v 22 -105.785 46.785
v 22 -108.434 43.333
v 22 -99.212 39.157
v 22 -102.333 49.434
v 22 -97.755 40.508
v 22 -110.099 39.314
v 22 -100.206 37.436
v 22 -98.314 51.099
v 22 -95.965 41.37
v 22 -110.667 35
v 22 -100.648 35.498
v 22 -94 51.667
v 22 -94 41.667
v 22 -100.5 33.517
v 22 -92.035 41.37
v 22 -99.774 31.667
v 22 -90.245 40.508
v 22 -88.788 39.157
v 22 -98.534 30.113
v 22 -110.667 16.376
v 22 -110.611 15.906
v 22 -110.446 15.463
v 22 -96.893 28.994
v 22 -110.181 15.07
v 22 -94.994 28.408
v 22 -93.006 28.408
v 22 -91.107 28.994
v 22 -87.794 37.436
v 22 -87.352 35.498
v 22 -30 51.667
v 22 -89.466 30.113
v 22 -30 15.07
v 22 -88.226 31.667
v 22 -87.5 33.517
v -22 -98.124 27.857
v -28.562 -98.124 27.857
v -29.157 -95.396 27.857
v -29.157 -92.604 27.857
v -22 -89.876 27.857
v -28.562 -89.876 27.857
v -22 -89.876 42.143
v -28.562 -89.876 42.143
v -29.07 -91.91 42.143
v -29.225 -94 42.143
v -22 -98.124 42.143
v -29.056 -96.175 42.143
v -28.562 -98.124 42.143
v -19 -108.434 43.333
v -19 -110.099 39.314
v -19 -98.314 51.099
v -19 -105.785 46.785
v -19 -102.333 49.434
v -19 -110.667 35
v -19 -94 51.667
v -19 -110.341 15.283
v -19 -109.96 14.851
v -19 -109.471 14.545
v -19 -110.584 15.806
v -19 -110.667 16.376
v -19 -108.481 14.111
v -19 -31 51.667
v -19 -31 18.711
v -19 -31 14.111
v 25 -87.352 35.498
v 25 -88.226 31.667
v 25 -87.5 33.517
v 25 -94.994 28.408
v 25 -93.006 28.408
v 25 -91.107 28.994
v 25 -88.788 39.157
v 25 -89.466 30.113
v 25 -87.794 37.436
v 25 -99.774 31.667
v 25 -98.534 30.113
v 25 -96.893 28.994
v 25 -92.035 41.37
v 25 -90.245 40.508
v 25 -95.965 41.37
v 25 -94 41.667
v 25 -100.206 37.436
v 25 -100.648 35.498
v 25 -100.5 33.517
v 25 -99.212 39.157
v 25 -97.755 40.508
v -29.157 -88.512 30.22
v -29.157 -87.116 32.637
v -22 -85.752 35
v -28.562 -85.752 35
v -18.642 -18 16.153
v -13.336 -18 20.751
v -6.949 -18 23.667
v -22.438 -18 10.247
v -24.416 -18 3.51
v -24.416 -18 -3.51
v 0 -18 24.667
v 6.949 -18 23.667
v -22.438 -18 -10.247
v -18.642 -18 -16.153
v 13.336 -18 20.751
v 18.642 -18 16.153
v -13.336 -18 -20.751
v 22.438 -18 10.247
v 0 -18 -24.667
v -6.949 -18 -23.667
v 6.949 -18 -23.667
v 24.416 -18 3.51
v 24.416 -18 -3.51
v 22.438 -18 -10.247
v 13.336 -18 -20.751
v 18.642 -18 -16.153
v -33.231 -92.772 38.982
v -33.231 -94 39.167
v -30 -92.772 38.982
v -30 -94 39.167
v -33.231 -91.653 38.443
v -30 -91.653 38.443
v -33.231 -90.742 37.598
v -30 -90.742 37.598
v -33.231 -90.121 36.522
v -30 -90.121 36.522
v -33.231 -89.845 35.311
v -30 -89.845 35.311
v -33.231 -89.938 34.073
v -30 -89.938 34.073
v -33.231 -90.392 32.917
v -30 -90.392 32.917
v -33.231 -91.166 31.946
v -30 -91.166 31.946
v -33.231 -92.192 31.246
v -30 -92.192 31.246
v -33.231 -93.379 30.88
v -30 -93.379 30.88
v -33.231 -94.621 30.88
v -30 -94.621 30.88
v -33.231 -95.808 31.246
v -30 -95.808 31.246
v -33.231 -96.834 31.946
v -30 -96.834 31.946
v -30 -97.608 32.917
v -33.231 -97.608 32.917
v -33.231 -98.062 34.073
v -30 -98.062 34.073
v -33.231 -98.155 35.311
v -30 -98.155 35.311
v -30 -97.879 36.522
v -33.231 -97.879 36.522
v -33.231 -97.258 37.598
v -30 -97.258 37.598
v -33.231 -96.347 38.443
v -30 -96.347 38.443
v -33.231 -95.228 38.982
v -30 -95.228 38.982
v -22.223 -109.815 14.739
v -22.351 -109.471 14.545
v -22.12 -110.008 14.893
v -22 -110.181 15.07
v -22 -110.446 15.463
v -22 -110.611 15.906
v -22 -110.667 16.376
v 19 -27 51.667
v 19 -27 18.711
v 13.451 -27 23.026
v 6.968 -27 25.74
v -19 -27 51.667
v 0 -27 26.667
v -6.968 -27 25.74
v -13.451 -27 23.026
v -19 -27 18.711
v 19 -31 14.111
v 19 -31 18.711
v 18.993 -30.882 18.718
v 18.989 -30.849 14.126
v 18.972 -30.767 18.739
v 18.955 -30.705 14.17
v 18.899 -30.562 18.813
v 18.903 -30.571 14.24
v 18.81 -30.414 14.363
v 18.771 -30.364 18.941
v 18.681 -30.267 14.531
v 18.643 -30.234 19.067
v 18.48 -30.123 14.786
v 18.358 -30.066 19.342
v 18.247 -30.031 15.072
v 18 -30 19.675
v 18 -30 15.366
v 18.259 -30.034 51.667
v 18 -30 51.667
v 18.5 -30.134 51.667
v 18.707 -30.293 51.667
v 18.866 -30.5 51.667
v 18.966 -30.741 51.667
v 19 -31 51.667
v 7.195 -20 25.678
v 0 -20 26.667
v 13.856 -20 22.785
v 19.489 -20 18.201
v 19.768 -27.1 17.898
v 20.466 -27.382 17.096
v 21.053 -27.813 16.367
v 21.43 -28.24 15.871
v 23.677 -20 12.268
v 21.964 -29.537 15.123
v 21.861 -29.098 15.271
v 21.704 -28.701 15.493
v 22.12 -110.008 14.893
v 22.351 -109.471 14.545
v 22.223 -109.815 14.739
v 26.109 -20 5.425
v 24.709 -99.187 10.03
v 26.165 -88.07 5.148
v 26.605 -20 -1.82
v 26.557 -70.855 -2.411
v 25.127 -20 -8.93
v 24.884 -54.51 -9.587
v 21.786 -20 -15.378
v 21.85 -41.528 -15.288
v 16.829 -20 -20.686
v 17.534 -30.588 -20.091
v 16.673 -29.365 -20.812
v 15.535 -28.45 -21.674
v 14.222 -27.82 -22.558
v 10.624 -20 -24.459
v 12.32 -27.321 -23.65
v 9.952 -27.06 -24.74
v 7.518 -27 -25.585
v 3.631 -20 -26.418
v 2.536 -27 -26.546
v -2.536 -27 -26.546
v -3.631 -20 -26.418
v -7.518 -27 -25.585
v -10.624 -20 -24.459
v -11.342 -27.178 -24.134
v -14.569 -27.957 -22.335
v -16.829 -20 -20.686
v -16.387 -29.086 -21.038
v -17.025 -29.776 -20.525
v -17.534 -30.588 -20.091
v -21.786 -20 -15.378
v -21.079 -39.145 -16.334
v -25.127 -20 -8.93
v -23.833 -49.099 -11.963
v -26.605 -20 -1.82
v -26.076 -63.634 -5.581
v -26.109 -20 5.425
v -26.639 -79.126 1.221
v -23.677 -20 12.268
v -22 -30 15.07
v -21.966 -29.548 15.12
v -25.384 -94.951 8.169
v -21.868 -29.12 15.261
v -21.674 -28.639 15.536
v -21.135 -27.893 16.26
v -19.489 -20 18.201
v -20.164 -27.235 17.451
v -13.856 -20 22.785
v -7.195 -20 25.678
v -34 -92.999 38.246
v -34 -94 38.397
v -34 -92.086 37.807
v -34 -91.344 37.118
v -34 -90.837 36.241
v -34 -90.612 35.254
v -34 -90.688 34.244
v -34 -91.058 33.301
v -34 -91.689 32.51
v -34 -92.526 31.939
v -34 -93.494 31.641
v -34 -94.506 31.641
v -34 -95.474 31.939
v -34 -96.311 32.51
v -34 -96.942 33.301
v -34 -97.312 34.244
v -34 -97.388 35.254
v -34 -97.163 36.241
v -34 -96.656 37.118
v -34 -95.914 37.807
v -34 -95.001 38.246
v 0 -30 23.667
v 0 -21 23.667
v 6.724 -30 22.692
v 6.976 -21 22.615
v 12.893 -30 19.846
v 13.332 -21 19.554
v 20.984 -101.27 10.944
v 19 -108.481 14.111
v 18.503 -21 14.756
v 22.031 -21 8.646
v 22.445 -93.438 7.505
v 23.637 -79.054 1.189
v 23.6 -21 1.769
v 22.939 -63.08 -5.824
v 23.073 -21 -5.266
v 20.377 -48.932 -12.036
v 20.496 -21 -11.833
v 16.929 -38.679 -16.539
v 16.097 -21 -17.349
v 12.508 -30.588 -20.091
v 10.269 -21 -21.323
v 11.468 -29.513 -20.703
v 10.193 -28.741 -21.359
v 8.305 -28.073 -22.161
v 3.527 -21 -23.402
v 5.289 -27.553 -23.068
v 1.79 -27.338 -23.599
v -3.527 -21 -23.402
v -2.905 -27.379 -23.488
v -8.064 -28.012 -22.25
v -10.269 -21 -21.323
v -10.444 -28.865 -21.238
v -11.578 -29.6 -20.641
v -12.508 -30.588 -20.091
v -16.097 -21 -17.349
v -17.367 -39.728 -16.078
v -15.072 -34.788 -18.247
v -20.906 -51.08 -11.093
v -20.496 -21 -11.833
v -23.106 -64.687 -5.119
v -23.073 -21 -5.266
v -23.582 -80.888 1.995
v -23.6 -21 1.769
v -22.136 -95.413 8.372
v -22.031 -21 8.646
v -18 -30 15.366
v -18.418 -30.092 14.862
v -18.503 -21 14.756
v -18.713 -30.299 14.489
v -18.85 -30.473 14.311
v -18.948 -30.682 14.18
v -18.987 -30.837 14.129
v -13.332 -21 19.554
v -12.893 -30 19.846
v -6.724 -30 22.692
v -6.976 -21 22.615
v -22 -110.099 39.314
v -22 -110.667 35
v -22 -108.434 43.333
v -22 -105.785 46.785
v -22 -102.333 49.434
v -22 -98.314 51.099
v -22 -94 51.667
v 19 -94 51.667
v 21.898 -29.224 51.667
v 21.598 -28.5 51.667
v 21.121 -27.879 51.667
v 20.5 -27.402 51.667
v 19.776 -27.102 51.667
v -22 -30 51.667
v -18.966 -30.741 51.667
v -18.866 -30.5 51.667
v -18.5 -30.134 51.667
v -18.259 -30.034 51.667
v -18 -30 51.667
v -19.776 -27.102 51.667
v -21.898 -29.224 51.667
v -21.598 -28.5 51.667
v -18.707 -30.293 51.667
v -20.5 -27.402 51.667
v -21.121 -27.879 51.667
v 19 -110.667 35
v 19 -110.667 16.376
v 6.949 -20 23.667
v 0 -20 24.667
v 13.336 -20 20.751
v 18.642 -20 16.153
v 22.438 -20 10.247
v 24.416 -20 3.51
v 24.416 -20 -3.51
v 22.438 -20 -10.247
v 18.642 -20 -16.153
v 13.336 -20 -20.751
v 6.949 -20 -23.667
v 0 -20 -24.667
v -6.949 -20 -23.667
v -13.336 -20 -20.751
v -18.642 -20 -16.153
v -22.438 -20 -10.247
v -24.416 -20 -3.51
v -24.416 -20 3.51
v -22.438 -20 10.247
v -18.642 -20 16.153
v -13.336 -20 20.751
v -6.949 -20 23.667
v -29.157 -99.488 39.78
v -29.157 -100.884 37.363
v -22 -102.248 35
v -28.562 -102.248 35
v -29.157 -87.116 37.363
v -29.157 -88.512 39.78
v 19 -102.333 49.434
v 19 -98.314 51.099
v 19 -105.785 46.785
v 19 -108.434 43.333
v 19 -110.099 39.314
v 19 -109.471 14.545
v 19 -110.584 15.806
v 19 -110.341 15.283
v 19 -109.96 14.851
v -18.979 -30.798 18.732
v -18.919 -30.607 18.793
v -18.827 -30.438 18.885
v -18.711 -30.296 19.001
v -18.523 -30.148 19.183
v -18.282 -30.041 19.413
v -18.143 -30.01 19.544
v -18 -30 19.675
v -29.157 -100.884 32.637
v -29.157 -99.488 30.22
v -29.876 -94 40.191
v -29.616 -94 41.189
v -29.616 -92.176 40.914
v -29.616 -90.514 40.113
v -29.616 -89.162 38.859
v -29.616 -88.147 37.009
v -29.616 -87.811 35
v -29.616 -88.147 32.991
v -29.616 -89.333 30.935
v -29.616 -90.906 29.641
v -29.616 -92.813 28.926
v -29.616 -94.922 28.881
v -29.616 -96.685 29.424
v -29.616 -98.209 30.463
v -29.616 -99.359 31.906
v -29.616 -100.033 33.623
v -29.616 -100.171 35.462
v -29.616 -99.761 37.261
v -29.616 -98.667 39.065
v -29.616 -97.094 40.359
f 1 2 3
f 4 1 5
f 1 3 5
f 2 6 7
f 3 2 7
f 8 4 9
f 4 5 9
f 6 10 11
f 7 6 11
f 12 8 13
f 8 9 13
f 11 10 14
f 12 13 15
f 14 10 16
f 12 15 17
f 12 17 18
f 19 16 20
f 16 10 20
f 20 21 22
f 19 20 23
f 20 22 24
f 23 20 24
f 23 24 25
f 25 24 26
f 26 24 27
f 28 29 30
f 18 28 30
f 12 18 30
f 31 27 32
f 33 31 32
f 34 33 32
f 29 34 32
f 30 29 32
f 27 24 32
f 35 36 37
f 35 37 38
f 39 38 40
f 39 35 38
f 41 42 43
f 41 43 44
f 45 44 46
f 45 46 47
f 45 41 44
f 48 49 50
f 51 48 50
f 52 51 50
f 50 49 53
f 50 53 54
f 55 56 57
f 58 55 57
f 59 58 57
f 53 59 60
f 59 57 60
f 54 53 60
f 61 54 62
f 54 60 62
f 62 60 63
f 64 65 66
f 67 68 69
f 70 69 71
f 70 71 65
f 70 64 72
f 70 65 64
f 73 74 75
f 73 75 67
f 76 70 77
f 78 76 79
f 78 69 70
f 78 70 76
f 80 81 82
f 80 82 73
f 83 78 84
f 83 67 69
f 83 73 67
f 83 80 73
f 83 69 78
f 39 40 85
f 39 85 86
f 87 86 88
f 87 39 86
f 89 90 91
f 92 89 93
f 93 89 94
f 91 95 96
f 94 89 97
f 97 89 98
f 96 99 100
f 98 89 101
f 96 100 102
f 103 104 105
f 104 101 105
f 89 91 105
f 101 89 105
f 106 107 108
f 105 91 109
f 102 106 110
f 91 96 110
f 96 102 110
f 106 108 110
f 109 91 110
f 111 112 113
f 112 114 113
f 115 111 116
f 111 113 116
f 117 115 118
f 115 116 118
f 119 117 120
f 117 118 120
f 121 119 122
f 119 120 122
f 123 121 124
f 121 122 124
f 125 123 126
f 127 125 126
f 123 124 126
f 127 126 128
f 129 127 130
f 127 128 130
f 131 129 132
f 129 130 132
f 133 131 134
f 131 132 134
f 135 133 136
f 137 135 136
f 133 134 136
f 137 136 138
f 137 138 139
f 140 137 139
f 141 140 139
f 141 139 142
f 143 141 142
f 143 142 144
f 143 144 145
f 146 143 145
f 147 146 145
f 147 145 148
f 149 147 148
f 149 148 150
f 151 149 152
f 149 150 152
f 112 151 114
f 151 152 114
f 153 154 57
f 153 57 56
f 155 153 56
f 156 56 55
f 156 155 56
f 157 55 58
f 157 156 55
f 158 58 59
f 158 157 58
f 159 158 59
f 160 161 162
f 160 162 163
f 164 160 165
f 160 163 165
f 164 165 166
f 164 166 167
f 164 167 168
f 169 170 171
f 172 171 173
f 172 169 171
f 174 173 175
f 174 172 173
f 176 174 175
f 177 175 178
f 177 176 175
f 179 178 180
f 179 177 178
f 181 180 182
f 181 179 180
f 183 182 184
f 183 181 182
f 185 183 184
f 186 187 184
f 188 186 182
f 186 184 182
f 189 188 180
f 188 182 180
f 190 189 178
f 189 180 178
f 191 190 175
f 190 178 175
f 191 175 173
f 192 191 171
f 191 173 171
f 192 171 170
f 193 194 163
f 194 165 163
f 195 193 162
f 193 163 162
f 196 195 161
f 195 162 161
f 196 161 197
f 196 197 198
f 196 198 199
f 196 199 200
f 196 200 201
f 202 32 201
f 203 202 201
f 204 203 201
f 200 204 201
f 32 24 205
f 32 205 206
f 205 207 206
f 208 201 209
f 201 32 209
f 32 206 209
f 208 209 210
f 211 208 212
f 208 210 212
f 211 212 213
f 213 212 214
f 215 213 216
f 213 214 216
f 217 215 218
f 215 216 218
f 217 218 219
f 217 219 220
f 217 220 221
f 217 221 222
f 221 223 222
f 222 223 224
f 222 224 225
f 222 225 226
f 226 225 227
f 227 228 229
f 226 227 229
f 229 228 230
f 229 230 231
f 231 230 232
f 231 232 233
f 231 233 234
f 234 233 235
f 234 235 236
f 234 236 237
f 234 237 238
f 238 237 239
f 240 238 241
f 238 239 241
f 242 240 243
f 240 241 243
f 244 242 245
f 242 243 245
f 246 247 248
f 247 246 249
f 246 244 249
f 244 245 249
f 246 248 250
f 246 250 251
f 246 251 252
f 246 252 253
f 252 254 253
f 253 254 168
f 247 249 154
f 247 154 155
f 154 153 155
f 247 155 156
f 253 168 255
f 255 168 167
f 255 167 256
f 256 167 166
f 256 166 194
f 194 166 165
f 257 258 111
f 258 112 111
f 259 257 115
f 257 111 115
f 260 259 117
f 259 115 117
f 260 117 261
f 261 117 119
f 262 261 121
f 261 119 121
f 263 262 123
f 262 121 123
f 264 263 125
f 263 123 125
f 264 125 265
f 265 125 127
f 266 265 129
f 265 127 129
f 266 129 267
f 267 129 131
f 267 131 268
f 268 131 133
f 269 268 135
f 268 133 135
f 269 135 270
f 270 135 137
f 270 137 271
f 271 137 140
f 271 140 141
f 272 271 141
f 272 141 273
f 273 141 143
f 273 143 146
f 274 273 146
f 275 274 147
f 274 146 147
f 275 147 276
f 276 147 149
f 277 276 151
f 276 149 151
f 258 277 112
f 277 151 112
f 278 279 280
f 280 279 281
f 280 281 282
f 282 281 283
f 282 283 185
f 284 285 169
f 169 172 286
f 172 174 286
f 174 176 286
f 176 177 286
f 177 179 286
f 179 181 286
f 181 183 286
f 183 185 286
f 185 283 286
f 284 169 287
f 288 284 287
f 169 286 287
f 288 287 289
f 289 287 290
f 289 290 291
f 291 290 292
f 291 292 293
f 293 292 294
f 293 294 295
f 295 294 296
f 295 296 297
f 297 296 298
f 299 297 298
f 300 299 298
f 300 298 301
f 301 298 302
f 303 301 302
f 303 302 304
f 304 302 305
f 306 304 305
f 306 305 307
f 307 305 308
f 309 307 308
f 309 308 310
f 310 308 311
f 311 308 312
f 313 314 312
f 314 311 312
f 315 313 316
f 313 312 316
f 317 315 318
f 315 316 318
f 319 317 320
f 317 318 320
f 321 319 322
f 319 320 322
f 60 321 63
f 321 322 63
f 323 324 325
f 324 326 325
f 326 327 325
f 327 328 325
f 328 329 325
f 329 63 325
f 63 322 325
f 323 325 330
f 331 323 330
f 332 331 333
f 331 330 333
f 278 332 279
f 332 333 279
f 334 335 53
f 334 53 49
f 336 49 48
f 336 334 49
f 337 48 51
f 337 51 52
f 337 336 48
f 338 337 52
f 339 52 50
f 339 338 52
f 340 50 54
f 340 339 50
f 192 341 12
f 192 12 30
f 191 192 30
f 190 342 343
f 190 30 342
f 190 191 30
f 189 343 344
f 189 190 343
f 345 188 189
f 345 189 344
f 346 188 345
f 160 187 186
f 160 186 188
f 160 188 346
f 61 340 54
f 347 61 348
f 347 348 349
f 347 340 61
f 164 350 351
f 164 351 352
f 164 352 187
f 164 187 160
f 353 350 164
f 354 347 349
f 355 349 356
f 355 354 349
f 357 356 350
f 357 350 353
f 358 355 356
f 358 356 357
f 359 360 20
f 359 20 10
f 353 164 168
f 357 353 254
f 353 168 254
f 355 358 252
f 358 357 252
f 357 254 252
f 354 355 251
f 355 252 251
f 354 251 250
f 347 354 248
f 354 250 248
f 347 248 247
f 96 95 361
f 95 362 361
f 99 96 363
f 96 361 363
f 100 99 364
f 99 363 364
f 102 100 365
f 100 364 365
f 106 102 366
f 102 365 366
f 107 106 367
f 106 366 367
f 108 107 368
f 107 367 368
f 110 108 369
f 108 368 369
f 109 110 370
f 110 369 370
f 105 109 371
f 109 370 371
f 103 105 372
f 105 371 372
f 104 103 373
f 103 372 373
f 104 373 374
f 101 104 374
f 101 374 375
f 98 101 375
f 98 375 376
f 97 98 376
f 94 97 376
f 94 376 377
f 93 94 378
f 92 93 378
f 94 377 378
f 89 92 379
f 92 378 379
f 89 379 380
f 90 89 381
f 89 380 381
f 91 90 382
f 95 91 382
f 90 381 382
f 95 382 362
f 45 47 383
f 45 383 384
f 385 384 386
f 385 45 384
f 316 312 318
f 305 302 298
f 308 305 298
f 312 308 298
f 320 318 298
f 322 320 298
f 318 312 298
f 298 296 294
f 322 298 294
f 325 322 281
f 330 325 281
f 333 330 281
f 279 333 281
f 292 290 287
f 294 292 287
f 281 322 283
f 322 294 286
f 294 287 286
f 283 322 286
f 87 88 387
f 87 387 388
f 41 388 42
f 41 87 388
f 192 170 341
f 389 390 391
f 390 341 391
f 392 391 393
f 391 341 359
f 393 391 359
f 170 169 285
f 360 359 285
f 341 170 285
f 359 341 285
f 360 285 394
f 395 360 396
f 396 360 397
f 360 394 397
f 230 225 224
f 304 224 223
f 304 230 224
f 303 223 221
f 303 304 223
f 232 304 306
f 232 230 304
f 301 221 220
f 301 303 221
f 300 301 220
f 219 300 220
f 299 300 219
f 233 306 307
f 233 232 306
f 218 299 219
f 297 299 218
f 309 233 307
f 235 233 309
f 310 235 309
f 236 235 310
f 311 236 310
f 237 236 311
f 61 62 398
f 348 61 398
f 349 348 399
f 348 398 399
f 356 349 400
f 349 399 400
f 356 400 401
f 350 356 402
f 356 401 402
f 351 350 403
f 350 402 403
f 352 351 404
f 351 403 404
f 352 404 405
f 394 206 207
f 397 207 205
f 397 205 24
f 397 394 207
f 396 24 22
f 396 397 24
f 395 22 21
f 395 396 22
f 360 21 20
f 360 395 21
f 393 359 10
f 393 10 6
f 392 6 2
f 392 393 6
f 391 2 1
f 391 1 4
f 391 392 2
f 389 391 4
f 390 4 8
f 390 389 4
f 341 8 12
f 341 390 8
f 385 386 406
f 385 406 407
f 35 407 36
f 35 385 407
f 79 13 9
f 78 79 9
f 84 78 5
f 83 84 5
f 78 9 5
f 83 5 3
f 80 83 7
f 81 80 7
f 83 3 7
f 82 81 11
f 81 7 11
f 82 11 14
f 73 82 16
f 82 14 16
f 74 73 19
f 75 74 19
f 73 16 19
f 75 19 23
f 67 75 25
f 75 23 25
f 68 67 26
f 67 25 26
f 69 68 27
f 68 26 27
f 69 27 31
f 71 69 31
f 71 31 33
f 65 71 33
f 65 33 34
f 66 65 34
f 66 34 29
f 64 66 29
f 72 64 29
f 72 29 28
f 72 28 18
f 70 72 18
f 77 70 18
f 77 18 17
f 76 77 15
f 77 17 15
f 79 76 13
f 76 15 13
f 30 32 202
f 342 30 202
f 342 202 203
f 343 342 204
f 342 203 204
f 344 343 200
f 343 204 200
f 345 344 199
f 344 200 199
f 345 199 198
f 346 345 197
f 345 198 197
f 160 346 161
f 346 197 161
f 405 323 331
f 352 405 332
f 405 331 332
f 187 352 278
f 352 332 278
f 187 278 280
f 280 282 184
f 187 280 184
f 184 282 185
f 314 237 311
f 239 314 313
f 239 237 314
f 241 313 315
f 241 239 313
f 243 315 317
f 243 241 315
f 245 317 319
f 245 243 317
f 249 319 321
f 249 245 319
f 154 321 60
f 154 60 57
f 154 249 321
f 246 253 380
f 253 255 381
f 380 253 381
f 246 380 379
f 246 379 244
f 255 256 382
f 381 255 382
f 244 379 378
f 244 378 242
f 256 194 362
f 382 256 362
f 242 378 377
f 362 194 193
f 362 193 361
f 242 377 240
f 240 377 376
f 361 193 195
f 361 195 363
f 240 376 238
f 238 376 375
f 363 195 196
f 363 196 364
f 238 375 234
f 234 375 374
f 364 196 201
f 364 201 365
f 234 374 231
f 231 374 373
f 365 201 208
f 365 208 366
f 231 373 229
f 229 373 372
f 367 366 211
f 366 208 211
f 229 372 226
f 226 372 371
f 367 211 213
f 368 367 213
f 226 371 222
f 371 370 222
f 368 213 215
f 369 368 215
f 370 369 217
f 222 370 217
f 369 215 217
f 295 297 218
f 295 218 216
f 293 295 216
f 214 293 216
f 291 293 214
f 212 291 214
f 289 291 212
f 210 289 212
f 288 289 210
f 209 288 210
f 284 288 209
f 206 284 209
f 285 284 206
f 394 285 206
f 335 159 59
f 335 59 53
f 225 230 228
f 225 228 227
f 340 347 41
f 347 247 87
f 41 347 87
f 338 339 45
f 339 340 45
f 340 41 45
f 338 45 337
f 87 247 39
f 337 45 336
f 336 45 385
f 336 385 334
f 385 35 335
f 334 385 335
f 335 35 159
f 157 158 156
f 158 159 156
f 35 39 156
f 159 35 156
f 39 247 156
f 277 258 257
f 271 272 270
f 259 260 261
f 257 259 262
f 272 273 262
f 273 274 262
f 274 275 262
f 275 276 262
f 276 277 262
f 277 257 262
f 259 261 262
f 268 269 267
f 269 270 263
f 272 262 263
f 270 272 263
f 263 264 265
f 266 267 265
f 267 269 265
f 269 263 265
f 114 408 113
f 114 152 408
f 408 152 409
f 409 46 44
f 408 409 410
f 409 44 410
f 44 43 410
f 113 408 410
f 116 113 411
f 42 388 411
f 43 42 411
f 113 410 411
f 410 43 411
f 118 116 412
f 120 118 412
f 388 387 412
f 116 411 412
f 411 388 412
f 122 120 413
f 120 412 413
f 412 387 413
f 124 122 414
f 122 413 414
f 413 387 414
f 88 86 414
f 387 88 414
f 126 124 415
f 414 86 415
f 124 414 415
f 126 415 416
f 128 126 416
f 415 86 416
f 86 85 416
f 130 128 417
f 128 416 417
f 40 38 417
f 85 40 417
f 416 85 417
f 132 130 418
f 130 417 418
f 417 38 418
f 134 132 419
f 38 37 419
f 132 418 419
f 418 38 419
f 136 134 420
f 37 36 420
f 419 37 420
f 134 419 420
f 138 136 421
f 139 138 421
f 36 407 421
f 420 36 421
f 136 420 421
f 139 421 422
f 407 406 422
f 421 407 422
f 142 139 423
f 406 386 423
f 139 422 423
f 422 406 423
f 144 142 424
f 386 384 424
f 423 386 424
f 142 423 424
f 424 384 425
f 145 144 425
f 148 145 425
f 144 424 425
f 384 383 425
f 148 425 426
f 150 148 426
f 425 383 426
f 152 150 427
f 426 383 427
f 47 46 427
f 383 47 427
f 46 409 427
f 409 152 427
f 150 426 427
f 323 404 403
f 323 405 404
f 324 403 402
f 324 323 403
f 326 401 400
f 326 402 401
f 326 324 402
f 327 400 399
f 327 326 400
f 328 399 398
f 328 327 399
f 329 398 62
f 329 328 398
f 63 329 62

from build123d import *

# Parameters (mm, degrees)
EXTRUDE_1_DEPTH          = 96
CUT_EXTRUDE_1_DEPTH      = 96
SKETCH_4_R               = 23.666666667
CUT_EXTRUDE_2_DEPTH      = 144
CUT_EXTRUDE_3_DEPTH      = 96
CUT_EXTRUDE_3_DEPTH_BACK = 96
SKETCH_7_R               = 9.192307692
CUT_EXTRUDE_4_DEPTH      = 20
SKETCH_8_R               = 6.666666667
EXTRUDE_2_DEPTH          = 3


with BuildPart() as part:
    # 草图1 → 旋转1 (revolve)
    with BuildSketch(Plane.XY, mode=Mode.PRIVATE) as revolve_1_sk:
        Polygon((0, -18), (24.666666667, -18), (24.666666667, -20), (26.666666667, -20), (26.666666667, -162), (0, -162), align=None)
    revolve(revolve_1_sk.sketch.rotate(Axis((0, -162, 0), (0, 1, 0)), 270), axis=Axis((0, -162, 0), (0, 1, 0)))

    # 草图2 → 凸台-拉伸1 (add)
    with BuildSketch(Plane.XY):
        with BuildLine():
            Line((-22, -171), (-19, -171))
            Line((-19, -171), (-19, -31))
            ThreePointArc((-19, -31), (-18.707106781, -30.292893219), (-18, -30))
            Line((-18, -30), (18, -30))
            ThreePointArc((18, -30), (18.707106781, -30.292893219), (19, -31))
            Line((19, -31), (19, -171))
            Line((19, -171), (22, -171))
            Line((22, -171), (22, -30))
            ThreePointArc((22, -30), (21.121320344, -27.878679656), (19, -27))
            Line((19, -27), (-19, -27))
            ThreePointArc((-19, -27), (-21.121320344, -27.878679656), (-22, -30))
            Line((-22, -30), (-22, -171))
        make_face()
    extrude(amount=EXTRUDE_1_DEPTH)

    # 草图3 → 切除-拉伸1 (cut)
    with BuildSketch(Plane.XY):
        with BuildLine():
            Line((-19, -171), (19, -171))
            Line((19, -171), (19, -31))
            ThreePointArc((19, -31), (18.707106781, -30.292893219), (18, -30))
            Line((18, -30), (-18, -30))
            ThreePointArc((-18, -30), (-18.707106781, -30.292893219), (-19, -31))
            Line((-19, -31), (-19, -171))
        make_face()
    extrude(amount=CUT_EXTRUDE_1_DEPTH, mode=Mode.SUBTRACT)

    # 草图4 → 切除-拉伸2 (cut)
    with BuildSketch(Plane(origin=(0, -21, 0), x_dir=(1, 0, 0), z_dir=(0, 1, 0))):
        with Locations(Location((0, 0, 0), (0, 0, 270))):
            Circle(SKETCH_4_R)
    extrude(amount=-CUT_EXTRUDE_2_DEPTH, mode=Mode.SUBTRACT)

    # 草图5 → 切除-拉伸3 (cut, two sides: drawn at the far end of the back side and taken through both)
    with BuildSketch(Plane(origin=(0, 0, 0), x_dir=(0, 0, -1), z_dir=(1, 0, 0)).offset(-CUT_EXTRUDE_3_DEPTH_BACK)):
        with BuildLine():
            Line((-150, -250), (50, -250))
            Line((50, -250), (50, -27))
            Line((50, -27), (25.585063646, -27))
            ThreePointArc((25.585063646, -27), (22.304312848, -27.976388331), (20.091324315, -30.587775267))
            Line((20.091324315, -30.587775267), (-14.545091957, -109.470741578))
            ThreePointArc((-14.545091957, -109.470741578), (-15.282754801, -110.34120389), (-16.3763384, -110.666666667))
            Line((-16.3763384, -110.666666667), (-35, -110.666666667))
            ThreePointArc((-35, -110.666666667), (-46.78511302, -105.78511302), (-51.666666667, -94))
            Line((-51.666666667, -94), (-51.666666667, 0))
            Line((-51.666666667, 0), (-150, 0))
            Line((-150, 0), (-150, -250))
        make_face()
    extrude(amount=CUT_EXTRUDE_3_DEPTH + CUT_EXTRUDE_3_DEPTH_BACK, mode=Mode.SUBTRACT)

    # 草图6 → 旋转2 (revolve)
    with BuildSketch(Plane.XY.offset(35), mode=Mode.PRIVATE) as revolve_2_sk:
        with BuildLine():
            Line((-34, -94), (-34, -90.602564103))
            Line((-34, -90.602564103), (-33.230769231, -89.833333333))
            Line((-33.230769231, -89.833333333), (-30, -89.833333333))
            ThreePointArc((-30, -89.833333333), (-29.556324994, -87.639723002), (-28.5, -85.666666667))
            Line((-28.5, -85.666666667), (-22, -85.666666667))
            Line((-22, -85.666666667), (-22, -94))
            Line((-22, -94), (-34, -94))
        make_face()
    revolve(revolve_2_sk.sketch.rotate(Axis((-22, -94, 35), (-1, 0, 0)), 270), axis=Axis((-22, -94, 35), (-1, 0, 0)))

    # 草图7 → 切除-拉伸4 (cut)
    with BuildSketch(Plane(origin=(-22, 0, 0), x_dir=(0, 0, -1), z_dir=(1, 0, 0))):
        with Locations((-35, -94)):
            Circle(SKETCH_7_R)
        Polygon((-42.142857143, -89.876069506), (-42.142857143, -98.123930494), (-35, -102.247860988), (-27.857142857, -98.123930494), (-27.857142857, -89.876069506), (-35, -85.752139012), align=None, mode=Mode.SUBTRACT)
    extrude(amount=-CUT_EXTRUDE_4_DEPTH, mode=Mode.SUBTRACT)

    # 草图8 → 凸台-拉伸2 (add)
    with BuildSketch(Plane(origin=(22, 0, 0), x_dir=(0, 0, -1), z_dir=(1, 0, 0))):
        with Locations(Location((-35, -94, 0), (0, 0, 180))):
            Circle(SKETCH_8_R)
    extrude(amount=EXTRUDE_2_DEPTH)


solid = part.part
